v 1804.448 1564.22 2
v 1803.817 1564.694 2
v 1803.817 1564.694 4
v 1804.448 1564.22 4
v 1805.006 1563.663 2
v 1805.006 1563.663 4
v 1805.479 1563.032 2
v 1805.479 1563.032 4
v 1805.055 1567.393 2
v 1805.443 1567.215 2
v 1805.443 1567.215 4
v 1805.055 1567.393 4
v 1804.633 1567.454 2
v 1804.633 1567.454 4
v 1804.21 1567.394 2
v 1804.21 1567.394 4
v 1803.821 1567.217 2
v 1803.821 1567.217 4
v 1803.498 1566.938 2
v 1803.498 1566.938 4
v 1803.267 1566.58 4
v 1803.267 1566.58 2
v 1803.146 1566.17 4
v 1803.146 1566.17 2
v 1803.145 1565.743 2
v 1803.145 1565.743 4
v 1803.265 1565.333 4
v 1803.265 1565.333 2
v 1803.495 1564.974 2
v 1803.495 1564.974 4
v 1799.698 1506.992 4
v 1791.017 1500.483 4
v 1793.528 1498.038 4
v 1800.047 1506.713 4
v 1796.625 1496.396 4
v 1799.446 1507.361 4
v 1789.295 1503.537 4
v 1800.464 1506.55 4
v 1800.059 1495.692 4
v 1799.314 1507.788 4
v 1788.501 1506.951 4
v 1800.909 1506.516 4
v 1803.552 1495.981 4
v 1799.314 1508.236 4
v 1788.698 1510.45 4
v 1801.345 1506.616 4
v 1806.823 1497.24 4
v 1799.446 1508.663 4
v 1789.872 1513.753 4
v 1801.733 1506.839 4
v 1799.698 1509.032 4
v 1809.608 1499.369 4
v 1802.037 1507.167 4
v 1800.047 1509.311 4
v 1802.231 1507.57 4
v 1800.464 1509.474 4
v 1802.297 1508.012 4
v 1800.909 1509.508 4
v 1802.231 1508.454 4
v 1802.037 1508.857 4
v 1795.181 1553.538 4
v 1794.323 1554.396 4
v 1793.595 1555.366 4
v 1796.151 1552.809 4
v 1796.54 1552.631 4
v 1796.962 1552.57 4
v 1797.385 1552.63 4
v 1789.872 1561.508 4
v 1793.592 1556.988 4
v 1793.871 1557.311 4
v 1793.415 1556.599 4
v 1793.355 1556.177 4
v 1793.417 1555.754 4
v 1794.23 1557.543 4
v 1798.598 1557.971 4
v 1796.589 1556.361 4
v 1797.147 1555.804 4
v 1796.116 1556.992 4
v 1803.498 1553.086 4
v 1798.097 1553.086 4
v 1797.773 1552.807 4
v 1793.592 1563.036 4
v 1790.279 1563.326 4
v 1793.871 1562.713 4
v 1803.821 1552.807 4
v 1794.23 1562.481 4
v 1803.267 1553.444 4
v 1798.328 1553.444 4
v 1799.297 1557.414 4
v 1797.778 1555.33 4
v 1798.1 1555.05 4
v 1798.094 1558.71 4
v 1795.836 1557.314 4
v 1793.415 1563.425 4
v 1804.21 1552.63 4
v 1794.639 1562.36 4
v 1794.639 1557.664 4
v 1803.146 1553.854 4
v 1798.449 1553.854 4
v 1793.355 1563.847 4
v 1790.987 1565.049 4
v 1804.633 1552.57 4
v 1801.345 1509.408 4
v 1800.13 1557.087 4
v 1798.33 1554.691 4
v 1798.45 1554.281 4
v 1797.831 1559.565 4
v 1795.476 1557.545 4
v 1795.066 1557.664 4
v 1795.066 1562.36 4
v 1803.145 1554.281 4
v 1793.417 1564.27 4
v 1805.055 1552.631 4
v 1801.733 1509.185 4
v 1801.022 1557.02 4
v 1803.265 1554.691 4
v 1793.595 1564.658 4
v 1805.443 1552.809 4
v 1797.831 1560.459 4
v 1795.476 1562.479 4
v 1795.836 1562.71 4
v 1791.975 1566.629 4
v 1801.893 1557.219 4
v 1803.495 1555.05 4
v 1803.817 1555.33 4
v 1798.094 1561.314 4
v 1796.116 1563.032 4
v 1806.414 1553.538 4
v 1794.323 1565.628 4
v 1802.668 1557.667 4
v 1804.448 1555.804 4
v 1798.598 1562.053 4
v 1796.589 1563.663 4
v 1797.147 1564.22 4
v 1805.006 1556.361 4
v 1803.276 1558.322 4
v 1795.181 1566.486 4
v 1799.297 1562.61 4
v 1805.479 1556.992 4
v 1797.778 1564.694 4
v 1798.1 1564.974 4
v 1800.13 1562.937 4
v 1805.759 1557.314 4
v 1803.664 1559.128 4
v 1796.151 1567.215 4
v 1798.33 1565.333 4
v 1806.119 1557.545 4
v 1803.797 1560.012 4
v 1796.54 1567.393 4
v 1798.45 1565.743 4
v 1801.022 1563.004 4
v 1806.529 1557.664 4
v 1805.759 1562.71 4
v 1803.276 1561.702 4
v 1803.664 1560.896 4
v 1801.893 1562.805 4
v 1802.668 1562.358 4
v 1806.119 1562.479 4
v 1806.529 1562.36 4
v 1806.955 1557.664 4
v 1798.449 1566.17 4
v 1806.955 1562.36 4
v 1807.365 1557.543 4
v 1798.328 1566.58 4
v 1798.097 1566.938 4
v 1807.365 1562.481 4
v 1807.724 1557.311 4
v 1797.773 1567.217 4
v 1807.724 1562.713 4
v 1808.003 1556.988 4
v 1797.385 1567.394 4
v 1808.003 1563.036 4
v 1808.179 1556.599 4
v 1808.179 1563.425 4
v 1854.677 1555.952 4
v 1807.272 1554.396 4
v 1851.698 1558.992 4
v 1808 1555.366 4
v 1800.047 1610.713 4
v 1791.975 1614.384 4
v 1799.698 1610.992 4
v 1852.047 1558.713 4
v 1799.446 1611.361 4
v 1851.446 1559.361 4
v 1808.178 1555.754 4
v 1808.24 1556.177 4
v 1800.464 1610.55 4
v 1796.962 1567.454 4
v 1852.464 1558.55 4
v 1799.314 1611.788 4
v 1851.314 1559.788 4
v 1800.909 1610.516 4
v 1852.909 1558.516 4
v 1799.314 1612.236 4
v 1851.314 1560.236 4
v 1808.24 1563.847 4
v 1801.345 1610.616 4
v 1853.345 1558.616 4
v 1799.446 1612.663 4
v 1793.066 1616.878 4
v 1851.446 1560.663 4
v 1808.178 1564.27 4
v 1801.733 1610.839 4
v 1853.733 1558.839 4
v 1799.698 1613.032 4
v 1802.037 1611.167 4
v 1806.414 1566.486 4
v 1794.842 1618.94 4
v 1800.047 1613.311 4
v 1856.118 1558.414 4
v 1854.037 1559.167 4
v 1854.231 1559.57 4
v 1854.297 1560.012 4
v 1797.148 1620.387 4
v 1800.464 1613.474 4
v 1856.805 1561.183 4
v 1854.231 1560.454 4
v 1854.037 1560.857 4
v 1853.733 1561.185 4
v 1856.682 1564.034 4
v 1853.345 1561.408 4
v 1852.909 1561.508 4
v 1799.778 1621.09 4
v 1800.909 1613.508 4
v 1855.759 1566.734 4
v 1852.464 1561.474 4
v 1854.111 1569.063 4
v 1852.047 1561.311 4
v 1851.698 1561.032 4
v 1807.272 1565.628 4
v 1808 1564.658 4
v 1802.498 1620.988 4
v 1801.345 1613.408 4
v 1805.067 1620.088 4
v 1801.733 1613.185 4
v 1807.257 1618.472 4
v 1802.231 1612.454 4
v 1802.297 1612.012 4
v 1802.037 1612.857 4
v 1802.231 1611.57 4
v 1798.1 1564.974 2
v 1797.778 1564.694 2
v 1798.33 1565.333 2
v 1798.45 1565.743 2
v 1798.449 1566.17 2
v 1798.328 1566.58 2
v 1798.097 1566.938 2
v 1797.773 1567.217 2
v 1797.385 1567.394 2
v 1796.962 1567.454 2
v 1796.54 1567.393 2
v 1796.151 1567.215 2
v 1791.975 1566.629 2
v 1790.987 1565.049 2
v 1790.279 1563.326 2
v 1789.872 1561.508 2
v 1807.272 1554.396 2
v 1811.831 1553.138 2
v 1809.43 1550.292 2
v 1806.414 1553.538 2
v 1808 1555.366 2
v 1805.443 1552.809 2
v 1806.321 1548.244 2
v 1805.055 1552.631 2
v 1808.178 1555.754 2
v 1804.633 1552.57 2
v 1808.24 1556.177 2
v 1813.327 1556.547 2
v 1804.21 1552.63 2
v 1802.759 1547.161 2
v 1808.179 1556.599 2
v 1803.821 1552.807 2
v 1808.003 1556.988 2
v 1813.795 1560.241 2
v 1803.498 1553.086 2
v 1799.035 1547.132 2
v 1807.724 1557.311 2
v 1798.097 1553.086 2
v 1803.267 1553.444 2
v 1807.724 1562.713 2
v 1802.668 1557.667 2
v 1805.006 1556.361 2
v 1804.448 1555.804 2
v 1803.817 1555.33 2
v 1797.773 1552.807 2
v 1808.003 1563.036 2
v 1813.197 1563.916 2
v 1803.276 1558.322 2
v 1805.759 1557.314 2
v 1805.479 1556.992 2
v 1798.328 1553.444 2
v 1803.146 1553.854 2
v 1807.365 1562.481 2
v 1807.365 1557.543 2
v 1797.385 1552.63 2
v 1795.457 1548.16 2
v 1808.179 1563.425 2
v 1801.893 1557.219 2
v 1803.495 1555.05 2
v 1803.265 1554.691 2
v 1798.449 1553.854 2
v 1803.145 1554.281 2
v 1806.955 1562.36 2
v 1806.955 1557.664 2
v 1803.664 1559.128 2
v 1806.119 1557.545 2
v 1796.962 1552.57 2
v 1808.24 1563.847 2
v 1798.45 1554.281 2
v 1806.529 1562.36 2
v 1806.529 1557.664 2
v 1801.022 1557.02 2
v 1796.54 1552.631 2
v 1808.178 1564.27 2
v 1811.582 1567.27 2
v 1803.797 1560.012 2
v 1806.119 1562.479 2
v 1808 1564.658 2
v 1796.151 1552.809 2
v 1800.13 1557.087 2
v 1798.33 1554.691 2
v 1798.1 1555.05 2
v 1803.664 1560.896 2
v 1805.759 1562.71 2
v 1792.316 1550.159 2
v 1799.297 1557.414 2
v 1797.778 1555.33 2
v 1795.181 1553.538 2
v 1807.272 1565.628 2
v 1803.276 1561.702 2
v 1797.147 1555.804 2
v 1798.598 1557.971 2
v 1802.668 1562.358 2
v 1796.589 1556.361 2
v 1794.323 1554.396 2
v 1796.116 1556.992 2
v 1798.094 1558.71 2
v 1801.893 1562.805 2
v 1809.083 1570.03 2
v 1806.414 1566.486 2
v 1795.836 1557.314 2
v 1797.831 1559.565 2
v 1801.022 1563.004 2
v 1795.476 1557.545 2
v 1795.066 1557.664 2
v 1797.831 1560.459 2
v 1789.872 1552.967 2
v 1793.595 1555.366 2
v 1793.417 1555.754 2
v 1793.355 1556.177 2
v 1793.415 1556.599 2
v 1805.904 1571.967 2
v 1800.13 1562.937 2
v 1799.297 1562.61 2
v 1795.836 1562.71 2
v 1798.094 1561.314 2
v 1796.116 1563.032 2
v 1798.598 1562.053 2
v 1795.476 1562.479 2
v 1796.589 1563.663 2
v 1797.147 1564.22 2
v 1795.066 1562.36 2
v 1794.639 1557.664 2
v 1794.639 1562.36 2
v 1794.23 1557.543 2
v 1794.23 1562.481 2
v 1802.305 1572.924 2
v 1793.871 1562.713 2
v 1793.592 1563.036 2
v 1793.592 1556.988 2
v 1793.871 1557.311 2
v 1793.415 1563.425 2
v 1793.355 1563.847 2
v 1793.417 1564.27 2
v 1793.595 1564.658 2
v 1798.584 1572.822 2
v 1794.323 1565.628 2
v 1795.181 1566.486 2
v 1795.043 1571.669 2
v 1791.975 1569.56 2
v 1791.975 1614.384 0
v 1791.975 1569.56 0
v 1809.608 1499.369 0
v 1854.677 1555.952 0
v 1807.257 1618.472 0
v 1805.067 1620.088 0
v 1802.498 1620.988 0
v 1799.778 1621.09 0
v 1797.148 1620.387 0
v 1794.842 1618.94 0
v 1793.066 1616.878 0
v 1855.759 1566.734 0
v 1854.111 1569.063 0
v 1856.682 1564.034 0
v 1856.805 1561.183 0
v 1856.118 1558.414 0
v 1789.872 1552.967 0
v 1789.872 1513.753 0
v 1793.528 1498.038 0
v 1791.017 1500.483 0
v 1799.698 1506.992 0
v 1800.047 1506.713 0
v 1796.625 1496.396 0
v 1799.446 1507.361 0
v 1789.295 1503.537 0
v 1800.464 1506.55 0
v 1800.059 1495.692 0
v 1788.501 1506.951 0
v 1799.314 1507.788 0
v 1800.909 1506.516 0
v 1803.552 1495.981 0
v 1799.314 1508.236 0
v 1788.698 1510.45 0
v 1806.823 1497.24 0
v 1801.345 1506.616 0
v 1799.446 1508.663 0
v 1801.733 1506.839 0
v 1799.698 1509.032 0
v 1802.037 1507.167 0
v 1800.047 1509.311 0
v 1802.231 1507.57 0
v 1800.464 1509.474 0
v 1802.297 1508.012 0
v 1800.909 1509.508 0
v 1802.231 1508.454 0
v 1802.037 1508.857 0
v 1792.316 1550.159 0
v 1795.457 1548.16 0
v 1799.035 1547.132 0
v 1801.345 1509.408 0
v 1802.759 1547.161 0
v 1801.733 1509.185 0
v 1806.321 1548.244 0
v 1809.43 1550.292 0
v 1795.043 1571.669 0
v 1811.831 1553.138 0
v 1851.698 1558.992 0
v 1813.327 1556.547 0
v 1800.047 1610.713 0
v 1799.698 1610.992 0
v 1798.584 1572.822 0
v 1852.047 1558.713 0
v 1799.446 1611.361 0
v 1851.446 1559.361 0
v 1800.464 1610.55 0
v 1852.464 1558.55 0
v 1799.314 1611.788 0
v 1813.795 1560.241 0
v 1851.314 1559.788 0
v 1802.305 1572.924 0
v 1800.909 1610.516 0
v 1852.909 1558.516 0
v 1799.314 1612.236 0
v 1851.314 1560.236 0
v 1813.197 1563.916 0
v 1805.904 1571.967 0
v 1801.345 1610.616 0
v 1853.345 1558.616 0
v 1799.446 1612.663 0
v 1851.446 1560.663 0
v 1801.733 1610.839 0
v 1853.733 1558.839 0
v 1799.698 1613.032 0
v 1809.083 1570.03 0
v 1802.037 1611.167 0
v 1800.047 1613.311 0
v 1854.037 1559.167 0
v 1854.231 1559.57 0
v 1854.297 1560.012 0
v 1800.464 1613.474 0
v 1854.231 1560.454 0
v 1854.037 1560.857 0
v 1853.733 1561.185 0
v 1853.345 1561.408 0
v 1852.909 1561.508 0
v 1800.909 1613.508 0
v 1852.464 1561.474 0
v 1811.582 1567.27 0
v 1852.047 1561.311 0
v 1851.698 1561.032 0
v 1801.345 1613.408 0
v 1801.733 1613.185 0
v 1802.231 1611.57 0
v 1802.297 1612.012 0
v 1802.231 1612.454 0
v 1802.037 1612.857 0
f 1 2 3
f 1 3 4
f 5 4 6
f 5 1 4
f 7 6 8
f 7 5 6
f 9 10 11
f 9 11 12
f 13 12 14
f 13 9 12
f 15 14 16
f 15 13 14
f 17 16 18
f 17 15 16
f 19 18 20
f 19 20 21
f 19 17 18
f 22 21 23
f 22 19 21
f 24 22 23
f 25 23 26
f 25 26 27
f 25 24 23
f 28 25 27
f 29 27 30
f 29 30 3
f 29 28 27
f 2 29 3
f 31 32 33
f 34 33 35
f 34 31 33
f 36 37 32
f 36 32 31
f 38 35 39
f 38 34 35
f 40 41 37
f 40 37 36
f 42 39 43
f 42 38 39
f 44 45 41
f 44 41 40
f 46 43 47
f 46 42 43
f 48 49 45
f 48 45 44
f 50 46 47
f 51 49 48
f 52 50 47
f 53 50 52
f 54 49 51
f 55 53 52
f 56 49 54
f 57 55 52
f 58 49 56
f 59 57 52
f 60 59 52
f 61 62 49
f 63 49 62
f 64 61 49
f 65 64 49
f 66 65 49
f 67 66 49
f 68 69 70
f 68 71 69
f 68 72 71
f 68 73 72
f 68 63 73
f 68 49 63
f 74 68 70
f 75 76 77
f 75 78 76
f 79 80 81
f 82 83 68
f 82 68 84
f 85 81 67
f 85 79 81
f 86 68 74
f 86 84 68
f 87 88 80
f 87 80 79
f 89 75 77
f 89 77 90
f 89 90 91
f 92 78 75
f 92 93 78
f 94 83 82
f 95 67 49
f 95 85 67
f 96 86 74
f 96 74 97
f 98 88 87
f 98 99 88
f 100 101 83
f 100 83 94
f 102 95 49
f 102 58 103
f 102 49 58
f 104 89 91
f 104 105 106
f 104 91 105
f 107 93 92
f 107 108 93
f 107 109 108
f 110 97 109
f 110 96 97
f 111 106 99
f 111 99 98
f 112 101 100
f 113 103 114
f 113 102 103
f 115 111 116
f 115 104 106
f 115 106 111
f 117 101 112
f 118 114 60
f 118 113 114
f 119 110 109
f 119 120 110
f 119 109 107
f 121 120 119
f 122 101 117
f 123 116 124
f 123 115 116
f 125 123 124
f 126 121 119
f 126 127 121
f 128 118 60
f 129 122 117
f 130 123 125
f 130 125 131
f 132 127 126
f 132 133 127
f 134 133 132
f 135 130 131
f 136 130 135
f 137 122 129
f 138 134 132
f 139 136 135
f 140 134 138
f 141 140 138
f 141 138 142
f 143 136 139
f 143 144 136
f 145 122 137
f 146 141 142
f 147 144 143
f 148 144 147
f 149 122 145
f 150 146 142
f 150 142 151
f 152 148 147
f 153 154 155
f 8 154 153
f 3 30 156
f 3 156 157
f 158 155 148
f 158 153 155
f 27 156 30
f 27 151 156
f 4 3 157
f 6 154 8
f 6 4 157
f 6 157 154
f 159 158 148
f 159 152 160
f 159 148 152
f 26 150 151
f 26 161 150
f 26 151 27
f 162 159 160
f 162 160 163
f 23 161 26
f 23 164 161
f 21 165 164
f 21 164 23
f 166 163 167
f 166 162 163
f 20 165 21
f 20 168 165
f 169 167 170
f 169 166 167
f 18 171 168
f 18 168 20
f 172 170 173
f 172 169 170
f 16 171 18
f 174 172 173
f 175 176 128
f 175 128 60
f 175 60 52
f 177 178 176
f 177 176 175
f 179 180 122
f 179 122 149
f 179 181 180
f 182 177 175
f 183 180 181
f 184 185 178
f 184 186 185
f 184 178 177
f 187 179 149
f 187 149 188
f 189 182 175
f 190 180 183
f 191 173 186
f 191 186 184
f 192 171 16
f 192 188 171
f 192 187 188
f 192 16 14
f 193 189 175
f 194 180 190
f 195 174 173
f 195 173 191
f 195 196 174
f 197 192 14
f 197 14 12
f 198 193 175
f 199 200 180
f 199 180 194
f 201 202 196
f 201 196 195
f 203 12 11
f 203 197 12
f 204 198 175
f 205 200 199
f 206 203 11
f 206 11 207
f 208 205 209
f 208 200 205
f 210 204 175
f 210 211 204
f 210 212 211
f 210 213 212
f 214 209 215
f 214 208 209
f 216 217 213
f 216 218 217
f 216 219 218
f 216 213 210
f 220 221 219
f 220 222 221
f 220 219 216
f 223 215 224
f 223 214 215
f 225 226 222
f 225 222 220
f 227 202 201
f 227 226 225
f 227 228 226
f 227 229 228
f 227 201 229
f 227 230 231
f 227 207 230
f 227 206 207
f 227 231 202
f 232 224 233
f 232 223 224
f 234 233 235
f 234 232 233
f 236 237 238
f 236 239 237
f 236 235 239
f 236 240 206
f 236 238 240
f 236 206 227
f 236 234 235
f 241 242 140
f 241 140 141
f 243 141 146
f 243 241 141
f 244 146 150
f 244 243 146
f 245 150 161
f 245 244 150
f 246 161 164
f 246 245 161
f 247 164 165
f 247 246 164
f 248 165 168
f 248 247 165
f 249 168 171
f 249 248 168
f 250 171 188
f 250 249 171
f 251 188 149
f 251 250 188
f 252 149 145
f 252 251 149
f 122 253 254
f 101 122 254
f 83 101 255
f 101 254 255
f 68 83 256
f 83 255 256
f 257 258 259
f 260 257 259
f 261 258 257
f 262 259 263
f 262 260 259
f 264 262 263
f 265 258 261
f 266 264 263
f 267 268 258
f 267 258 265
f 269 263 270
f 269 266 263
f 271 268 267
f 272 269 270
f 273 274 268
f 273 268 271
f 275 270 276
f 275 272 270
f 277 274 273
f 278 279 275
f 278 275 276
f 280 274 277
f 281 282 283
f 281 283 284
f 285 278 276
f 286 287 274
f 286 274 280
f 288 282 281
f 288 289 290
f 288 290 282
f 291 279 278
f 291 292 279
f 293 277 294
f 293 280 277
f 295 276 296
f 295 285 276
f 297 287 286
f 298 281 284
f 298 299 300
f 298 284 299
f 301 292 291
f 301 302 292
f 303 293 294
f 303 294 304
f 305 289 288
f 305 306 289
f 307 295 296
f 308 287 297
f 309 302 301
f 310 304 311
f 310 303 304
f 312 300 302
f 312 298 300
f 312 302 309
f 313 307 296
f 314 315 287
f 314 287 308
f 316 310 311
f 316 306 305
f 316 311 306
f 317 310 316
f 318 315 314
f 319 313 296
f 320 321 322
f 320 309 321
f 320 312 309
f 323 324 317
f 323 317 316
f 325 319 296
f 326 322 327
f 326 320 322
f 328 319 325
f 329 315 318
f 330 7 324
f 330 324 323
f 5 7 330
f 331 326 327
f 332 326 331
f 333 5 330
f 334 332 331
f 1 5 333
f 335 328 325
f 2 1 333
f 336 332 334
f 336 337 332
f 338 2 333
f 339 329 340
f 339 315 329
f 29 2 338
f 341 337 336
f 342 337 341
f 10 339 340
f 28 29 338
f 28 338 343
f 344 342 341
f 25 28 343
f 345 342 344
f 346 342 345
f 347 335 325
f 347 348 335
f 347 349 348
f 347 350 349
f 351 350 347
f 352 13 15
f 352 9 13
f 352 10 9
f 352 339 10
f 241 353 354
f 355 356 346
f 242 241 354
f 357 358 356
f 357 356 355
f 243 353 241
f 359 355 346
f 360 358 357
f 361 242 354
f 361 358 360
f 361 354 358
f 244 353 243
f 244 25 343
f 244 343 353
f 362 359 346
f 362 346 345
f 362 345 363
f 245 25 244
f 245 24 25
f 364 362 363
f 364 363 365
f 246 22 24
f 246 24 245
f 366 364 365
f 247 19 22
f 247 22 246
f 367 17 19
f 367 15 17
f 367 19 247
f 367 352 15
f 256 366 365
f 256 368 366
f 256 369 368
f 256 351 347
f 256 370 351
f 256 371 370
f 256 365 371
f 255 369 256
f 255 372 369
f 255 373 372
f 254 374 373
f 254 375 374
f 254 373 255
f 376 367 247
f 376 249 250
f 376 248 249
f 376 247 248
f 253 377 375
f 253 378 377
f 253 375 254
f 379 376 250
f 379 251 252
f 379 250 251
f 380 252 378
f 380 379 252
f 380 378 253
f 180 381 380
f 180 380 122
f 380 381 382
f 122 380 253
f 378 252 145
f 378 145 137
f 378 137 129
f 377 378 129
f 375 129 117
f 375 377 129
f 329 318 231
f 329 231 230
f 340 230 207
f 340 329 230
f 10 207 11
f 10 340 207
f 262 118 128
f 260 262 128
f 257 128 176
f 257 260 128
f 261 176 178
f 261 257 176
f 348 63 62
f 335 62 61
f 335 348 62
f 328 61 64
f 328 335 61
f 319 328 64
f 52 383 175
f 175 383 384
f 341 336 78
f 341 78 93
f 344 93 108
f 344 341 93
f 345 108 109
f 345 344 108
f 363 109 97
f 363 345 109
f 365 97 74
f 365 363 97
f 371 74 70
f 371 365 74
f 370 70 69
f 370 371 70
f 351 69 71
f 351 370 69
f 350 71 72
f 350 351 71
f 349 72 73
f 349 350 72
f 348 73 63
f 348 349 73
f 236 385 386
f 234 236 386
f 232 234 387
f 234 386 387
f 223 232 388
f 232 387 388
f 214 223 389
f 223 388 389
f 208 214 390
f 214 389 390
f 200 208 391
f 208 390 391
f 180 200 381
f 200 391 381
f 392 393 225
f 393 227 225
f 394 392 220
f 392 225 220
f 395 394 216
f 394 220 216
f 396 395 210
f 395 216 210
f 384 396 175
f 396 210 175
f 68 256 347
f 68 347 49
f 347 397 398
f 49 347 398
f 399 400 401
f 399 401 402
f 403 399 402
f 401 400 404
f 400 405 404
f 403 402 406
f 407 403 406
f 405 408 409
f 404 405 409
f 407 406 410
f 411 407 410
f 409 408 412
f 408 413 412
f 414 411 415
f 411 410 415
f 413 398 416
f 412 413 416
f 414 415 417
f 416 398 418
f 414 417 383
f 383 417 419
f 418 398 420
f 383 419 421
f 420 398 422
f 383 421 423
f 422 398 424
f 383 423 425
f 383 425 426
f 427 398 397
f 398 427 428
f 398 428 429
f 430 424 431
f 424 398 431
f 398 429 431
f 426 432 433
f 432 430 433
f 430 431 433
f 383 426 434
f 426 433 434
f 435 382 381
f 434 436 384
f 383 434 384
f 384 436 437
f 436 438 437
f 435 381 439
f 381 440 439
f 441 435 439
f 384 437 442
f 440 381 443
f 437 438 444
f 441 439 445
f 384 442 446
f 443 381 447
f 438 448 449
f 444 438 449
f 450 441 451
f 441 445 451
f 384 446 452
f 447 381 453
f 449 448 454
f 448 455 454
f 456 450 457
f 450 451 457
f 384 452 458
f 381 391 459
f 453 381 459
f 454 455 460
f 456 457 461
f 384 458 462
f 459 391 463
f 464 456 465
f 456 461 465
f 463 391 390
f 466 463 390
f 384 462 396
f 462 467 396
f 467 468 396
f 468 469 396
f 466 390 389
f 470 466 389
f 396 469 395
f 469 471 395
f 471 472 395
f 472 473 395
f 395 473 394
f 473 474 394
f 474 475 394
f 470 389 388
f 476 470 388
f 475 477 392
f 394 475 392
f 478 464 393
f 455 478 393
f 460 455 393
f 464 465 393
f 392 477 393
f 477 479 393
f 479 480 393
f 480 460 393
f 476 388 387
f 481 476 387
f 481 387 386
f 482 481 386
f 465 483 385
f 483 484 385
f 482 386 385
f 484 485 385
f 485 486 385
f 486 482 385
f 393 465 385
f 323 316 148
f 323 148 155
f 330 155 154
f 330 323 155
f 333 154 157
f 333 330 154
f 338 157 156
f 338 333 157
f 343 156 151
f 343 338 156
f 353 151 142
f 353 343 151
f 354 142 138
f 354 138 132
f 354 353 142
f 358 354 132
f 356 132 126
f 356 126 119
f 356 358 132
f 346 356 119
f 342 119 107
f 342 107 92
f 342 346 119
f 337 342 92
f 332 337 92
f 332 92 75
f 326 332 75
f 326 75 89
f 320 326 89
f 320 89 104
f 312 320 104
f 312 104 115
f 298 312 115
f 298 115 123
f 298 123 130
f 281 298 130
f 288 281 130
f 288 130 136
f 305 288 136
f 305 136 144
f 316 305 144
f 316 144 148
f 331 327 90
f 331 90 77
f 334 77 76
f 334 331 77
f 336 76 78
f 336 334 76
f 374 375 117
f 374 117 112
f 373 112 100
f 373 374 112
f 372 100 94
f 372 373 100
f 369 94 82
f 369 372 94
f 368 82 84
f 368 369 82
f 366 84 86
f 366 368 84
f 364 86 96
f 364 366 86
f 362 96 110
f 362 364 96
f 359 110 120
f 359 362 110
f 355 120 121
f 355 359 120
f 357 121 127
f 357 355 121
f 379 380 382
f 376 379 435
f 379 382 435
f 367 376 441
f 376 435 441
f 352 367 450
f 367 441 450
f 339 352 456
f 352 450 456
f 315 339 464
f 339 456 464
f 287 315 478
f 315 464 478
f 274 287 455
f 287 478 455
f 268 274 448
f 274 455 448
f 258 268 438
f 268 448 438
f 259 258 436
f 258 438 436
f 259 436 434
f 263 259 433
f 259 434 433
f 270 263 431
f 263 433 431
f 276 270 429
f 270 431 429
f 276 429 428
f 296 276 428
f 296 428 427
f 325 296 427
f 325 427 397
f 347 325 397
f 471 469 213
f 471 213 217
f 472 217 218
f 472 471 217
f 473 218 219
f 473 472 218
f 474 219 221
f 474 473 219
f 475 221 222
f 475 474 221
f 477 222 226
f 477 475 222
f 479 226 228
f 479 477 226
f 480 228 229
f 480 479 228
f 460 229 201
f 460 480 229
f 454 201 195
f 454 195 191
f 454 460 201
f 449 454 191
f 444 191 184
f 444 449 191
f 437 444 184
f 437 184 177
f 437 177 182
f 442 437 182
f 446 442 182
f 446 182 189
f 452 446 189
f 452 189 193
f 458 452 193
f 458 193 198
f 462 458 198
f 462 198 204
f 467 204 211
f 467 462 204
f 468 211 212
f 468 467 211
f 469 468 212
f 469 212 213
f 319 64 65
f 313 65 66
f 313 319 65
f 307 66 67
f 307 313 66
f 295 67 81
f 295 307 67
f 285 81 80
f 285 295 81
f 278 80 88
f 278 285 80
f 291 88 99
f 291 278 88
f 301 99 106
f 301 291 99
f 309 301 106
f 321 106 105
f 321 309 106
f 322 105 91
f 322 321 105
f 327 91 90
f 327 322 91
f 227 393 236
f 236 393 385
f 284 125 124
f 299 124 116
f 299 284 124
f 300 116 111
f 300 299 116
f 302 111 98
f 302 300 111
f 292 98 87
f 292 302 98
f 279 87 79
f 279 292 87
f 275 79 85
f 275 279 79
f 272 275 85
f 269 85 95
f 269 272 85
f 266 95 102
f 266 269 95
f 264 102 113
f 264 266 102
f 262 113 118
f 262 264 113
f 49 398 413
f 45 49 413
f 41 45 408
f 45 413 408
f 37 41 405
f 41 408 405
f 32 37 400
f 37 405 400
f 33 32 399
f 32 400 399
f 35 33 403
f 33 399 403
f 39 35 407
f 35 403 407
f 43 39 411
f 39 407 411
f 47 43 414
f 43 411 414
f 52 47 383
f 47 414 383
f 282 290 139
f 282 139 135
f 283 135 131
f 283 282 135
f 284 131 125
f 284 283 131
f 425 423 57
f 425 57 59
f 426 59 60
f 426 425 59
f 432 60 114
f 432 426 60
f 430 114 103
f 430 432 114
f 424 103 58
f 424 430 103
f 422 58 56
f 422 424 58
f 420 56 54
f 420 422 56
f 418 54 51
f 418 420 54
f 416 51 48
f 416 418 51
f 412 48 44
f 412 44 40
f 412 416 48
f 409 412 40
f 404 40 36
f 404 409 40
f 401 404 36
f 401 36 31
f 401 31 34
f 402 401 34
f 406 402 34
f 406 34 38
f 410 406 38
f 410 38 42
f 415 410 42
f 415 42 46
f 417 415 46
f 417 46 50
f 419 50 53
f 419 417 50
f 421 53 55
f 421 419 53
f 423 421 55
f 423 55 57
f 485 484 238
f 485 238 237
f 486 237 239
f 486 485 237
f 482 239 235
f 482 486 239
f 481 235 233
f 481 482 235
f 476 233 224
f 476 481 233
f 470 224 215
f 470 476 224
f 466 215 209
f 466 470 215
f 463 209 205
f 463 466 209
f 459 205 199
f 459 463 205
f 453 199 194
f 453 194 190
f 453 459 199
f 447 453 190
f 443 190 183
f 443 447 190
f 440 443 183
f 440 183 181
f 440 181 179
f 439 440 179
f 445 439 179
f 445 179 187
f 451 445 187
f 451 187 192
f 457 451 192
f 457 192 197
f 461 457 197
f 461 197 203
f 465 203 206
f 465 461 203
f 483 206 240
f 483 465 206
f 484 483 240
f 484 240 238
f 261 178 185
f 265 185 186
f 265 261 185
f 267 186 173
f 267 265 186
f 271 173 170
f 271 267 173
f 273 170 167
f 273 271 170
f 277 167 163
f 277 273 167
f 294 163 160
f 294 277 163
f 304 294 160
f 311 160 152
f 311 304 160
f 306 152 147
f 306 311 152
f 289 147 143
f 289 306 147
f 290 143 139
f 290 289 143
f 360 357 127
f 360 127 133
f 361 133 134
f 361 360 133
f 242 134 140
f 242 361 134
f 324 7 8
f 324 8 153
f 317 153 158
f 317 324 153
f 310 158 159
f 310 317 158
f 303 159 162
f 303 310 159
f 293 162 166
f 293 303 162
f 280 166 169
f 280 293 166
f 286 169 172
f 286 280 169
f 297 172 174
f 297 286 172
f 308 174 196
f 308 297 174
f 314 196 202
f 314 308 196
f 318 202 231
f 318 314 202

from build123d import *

# Parameters (mm, degrees)
SKETCH_1_R          = 3
SKETCH_1_R_2        = 1.5
EXTRUDE_1_DEPTH     = 4
SKETCH_3_R          = 13
CUT_EXTRUDE_2_DEPTH = 2
FILLET_1_R          = 10


with BuildPart() as part:
    # 草图1 → 凸台-拉伸1 (new body)
    with BuildSketch(Plane.XY):
        with BuildLine():
            Line((1791.975111059, 1614.383538533), (1791.975111059, 1566.628704537))
            ThreePointArc((1791.975111059, 1566.628704537), (1790.596787079, 1564.202595154), (1789.871515189, 1561.508200154))
            Line((1789.871515189, 1561.508200154), (1789.871515189, 1513.753366158))
            ThreePointArc((1789.871515189, 1513.753366158), (1793.527688188, 1498.037586639), (1809.60815907, 1499.368670076))
            Line((1809.60815907, 1499.368670076), (1860.094660389, 1562.753352309))
            Line((1860.094660389, 1562.753352309), (1807.257102758, 1618.471746967))
            ThreePointArc((1807.257102758, 1618.471746967), (1798.436490976, 1620.837124602), (1791.975111059, 1614.383538533))
        make_face()
        with Locations((1800.797367784, 1560.012011993)):
            Circle(SKETCH_1_R, mode=Mode.SUBTRACT)
        with Locations((1800.797367784, 1612.012011993)):
            Circle(SKETCH_1_R_2, mode=Mode.SUBTRACT)
        with Locations((1852.797367784, 1560.012011993)):
            Circle(SKETCH_1_R_2, mode=Mode.SUBTRACT)
        with Locations((1800.797367784, 1508.012011993)):
            Circle(SKETCH_1_R_2, mode=Mode.SUBTRACT)
        with BuildLine():
            ThreePointArc((1805.443255224, 1552.809308797), (1806.858027956, 1553.951351821), (1808.000070981, 1555.366124554))
            ThreePointArc((1808.000070981, 1555.366124554), (1807.55260939, 1557.43971519), (1805.479018754, 1556.992253599))
            ThreePointArc((1805.479018754, 1556.992253599), (1804.736707613, 1556.072672165), (1803.817126178, 1555.330361023))
            ThreePointArc((1803.817126178, 1555.330361023), (1803.369664588, 1553.256770387), (1805.443255224, 1552.809308797))
        make_face(mode=Mode.SUBTRACT)
        with BuildLine():
            ThreePointArc((1808.000070981, 1564.657899433), (1806.858027956, 1566.072672165), (1805.443255224, 1567.21471519))
            ThreePointArc((1805.443255224, 1567.21471519), (1803.369664588, 1566.767253599), (1803.817126178, 1564.693662963))
            ThreePointArc((1803.817126178, 1564.693662963), (1804.736707613, 1563.951351821), (1805.479018754, 1563.031770387))
            ThreePointArc((1805.479018754, 1563.031770387), (1807.55260939, 1562.584308797), (1808.000070981, 1564.657899433))
        make_face(mode=Mode.SUBTRACT)
        with BuildLine():
            ThreePointArc((1796.151480345, 1567.21471519), (1794.736707613, 1566.072672165), (1793.594664588, 1564.657899433))
            ThreePointArc((1793.594664588, 1564.657899433), (1794.042126178, 1562.584308797), (1796.115716814, 1563.031770387))
            ThreePointArc((1796.115716814, 1563.031770387), (1796.858027956, 1563.951351821), (1797.77760939, 1564.693662963))
            ThreePointArc((1797.77760939, 1564.693662963), (1798.225070981, 1566.767253599), (1796.151480345, 1567.21471519))
        make_face(mode=Mode.SUBTRACT)
        with BuildLine():
            ThreePointArc((1793.594664588, 1555.366124554), (1794.736707613, 1553.951351821), (1796.151480345, 1552.809308797))
            ThreePointArc((1796.151480345, 1552.809308797), (1798.225070981, 1553.256770387), (1797.77760939, 1555.330361023))
            ThreePointArc((1797.77760939, 1555.330361023), (1796.858027956, 1556.072672165), (1796.115716814, 1556.992253599))
            ThreePointArc((1796.115716814, 1556.992253599), (1794.042126178, 1557.43971519), (1793.594664588, 1555.366124554))
        make_face(mode=Mode.SUBTRACT)
    extrude(amount=EXTRUDE_1_DEPTH)

    # 草图3 → 切除-拉伸2 (cut)
    with BuildSketch(Plane(origin=(0, 0, 0), x_dir=(-1, 0, 0), z_dir=(0, 0, -1))):
        with Locations((-1800.797367784, 1560.012011993)):
            Circle(SKETCH_3_R)
    extrude(amount=-CUT_EXTRUDE_2_DEPTH, mode=Mode.SUBTRACT)

    # 圆角1
    fillet_1_edges = [part.edges().sort_by_distance(p)[0] for p in [
        (1860.094660389, 1562.753352309, 2),
    ]]
    fillet(fillet_1_edges, radius=FILLET_1_R)


solid = part.part
